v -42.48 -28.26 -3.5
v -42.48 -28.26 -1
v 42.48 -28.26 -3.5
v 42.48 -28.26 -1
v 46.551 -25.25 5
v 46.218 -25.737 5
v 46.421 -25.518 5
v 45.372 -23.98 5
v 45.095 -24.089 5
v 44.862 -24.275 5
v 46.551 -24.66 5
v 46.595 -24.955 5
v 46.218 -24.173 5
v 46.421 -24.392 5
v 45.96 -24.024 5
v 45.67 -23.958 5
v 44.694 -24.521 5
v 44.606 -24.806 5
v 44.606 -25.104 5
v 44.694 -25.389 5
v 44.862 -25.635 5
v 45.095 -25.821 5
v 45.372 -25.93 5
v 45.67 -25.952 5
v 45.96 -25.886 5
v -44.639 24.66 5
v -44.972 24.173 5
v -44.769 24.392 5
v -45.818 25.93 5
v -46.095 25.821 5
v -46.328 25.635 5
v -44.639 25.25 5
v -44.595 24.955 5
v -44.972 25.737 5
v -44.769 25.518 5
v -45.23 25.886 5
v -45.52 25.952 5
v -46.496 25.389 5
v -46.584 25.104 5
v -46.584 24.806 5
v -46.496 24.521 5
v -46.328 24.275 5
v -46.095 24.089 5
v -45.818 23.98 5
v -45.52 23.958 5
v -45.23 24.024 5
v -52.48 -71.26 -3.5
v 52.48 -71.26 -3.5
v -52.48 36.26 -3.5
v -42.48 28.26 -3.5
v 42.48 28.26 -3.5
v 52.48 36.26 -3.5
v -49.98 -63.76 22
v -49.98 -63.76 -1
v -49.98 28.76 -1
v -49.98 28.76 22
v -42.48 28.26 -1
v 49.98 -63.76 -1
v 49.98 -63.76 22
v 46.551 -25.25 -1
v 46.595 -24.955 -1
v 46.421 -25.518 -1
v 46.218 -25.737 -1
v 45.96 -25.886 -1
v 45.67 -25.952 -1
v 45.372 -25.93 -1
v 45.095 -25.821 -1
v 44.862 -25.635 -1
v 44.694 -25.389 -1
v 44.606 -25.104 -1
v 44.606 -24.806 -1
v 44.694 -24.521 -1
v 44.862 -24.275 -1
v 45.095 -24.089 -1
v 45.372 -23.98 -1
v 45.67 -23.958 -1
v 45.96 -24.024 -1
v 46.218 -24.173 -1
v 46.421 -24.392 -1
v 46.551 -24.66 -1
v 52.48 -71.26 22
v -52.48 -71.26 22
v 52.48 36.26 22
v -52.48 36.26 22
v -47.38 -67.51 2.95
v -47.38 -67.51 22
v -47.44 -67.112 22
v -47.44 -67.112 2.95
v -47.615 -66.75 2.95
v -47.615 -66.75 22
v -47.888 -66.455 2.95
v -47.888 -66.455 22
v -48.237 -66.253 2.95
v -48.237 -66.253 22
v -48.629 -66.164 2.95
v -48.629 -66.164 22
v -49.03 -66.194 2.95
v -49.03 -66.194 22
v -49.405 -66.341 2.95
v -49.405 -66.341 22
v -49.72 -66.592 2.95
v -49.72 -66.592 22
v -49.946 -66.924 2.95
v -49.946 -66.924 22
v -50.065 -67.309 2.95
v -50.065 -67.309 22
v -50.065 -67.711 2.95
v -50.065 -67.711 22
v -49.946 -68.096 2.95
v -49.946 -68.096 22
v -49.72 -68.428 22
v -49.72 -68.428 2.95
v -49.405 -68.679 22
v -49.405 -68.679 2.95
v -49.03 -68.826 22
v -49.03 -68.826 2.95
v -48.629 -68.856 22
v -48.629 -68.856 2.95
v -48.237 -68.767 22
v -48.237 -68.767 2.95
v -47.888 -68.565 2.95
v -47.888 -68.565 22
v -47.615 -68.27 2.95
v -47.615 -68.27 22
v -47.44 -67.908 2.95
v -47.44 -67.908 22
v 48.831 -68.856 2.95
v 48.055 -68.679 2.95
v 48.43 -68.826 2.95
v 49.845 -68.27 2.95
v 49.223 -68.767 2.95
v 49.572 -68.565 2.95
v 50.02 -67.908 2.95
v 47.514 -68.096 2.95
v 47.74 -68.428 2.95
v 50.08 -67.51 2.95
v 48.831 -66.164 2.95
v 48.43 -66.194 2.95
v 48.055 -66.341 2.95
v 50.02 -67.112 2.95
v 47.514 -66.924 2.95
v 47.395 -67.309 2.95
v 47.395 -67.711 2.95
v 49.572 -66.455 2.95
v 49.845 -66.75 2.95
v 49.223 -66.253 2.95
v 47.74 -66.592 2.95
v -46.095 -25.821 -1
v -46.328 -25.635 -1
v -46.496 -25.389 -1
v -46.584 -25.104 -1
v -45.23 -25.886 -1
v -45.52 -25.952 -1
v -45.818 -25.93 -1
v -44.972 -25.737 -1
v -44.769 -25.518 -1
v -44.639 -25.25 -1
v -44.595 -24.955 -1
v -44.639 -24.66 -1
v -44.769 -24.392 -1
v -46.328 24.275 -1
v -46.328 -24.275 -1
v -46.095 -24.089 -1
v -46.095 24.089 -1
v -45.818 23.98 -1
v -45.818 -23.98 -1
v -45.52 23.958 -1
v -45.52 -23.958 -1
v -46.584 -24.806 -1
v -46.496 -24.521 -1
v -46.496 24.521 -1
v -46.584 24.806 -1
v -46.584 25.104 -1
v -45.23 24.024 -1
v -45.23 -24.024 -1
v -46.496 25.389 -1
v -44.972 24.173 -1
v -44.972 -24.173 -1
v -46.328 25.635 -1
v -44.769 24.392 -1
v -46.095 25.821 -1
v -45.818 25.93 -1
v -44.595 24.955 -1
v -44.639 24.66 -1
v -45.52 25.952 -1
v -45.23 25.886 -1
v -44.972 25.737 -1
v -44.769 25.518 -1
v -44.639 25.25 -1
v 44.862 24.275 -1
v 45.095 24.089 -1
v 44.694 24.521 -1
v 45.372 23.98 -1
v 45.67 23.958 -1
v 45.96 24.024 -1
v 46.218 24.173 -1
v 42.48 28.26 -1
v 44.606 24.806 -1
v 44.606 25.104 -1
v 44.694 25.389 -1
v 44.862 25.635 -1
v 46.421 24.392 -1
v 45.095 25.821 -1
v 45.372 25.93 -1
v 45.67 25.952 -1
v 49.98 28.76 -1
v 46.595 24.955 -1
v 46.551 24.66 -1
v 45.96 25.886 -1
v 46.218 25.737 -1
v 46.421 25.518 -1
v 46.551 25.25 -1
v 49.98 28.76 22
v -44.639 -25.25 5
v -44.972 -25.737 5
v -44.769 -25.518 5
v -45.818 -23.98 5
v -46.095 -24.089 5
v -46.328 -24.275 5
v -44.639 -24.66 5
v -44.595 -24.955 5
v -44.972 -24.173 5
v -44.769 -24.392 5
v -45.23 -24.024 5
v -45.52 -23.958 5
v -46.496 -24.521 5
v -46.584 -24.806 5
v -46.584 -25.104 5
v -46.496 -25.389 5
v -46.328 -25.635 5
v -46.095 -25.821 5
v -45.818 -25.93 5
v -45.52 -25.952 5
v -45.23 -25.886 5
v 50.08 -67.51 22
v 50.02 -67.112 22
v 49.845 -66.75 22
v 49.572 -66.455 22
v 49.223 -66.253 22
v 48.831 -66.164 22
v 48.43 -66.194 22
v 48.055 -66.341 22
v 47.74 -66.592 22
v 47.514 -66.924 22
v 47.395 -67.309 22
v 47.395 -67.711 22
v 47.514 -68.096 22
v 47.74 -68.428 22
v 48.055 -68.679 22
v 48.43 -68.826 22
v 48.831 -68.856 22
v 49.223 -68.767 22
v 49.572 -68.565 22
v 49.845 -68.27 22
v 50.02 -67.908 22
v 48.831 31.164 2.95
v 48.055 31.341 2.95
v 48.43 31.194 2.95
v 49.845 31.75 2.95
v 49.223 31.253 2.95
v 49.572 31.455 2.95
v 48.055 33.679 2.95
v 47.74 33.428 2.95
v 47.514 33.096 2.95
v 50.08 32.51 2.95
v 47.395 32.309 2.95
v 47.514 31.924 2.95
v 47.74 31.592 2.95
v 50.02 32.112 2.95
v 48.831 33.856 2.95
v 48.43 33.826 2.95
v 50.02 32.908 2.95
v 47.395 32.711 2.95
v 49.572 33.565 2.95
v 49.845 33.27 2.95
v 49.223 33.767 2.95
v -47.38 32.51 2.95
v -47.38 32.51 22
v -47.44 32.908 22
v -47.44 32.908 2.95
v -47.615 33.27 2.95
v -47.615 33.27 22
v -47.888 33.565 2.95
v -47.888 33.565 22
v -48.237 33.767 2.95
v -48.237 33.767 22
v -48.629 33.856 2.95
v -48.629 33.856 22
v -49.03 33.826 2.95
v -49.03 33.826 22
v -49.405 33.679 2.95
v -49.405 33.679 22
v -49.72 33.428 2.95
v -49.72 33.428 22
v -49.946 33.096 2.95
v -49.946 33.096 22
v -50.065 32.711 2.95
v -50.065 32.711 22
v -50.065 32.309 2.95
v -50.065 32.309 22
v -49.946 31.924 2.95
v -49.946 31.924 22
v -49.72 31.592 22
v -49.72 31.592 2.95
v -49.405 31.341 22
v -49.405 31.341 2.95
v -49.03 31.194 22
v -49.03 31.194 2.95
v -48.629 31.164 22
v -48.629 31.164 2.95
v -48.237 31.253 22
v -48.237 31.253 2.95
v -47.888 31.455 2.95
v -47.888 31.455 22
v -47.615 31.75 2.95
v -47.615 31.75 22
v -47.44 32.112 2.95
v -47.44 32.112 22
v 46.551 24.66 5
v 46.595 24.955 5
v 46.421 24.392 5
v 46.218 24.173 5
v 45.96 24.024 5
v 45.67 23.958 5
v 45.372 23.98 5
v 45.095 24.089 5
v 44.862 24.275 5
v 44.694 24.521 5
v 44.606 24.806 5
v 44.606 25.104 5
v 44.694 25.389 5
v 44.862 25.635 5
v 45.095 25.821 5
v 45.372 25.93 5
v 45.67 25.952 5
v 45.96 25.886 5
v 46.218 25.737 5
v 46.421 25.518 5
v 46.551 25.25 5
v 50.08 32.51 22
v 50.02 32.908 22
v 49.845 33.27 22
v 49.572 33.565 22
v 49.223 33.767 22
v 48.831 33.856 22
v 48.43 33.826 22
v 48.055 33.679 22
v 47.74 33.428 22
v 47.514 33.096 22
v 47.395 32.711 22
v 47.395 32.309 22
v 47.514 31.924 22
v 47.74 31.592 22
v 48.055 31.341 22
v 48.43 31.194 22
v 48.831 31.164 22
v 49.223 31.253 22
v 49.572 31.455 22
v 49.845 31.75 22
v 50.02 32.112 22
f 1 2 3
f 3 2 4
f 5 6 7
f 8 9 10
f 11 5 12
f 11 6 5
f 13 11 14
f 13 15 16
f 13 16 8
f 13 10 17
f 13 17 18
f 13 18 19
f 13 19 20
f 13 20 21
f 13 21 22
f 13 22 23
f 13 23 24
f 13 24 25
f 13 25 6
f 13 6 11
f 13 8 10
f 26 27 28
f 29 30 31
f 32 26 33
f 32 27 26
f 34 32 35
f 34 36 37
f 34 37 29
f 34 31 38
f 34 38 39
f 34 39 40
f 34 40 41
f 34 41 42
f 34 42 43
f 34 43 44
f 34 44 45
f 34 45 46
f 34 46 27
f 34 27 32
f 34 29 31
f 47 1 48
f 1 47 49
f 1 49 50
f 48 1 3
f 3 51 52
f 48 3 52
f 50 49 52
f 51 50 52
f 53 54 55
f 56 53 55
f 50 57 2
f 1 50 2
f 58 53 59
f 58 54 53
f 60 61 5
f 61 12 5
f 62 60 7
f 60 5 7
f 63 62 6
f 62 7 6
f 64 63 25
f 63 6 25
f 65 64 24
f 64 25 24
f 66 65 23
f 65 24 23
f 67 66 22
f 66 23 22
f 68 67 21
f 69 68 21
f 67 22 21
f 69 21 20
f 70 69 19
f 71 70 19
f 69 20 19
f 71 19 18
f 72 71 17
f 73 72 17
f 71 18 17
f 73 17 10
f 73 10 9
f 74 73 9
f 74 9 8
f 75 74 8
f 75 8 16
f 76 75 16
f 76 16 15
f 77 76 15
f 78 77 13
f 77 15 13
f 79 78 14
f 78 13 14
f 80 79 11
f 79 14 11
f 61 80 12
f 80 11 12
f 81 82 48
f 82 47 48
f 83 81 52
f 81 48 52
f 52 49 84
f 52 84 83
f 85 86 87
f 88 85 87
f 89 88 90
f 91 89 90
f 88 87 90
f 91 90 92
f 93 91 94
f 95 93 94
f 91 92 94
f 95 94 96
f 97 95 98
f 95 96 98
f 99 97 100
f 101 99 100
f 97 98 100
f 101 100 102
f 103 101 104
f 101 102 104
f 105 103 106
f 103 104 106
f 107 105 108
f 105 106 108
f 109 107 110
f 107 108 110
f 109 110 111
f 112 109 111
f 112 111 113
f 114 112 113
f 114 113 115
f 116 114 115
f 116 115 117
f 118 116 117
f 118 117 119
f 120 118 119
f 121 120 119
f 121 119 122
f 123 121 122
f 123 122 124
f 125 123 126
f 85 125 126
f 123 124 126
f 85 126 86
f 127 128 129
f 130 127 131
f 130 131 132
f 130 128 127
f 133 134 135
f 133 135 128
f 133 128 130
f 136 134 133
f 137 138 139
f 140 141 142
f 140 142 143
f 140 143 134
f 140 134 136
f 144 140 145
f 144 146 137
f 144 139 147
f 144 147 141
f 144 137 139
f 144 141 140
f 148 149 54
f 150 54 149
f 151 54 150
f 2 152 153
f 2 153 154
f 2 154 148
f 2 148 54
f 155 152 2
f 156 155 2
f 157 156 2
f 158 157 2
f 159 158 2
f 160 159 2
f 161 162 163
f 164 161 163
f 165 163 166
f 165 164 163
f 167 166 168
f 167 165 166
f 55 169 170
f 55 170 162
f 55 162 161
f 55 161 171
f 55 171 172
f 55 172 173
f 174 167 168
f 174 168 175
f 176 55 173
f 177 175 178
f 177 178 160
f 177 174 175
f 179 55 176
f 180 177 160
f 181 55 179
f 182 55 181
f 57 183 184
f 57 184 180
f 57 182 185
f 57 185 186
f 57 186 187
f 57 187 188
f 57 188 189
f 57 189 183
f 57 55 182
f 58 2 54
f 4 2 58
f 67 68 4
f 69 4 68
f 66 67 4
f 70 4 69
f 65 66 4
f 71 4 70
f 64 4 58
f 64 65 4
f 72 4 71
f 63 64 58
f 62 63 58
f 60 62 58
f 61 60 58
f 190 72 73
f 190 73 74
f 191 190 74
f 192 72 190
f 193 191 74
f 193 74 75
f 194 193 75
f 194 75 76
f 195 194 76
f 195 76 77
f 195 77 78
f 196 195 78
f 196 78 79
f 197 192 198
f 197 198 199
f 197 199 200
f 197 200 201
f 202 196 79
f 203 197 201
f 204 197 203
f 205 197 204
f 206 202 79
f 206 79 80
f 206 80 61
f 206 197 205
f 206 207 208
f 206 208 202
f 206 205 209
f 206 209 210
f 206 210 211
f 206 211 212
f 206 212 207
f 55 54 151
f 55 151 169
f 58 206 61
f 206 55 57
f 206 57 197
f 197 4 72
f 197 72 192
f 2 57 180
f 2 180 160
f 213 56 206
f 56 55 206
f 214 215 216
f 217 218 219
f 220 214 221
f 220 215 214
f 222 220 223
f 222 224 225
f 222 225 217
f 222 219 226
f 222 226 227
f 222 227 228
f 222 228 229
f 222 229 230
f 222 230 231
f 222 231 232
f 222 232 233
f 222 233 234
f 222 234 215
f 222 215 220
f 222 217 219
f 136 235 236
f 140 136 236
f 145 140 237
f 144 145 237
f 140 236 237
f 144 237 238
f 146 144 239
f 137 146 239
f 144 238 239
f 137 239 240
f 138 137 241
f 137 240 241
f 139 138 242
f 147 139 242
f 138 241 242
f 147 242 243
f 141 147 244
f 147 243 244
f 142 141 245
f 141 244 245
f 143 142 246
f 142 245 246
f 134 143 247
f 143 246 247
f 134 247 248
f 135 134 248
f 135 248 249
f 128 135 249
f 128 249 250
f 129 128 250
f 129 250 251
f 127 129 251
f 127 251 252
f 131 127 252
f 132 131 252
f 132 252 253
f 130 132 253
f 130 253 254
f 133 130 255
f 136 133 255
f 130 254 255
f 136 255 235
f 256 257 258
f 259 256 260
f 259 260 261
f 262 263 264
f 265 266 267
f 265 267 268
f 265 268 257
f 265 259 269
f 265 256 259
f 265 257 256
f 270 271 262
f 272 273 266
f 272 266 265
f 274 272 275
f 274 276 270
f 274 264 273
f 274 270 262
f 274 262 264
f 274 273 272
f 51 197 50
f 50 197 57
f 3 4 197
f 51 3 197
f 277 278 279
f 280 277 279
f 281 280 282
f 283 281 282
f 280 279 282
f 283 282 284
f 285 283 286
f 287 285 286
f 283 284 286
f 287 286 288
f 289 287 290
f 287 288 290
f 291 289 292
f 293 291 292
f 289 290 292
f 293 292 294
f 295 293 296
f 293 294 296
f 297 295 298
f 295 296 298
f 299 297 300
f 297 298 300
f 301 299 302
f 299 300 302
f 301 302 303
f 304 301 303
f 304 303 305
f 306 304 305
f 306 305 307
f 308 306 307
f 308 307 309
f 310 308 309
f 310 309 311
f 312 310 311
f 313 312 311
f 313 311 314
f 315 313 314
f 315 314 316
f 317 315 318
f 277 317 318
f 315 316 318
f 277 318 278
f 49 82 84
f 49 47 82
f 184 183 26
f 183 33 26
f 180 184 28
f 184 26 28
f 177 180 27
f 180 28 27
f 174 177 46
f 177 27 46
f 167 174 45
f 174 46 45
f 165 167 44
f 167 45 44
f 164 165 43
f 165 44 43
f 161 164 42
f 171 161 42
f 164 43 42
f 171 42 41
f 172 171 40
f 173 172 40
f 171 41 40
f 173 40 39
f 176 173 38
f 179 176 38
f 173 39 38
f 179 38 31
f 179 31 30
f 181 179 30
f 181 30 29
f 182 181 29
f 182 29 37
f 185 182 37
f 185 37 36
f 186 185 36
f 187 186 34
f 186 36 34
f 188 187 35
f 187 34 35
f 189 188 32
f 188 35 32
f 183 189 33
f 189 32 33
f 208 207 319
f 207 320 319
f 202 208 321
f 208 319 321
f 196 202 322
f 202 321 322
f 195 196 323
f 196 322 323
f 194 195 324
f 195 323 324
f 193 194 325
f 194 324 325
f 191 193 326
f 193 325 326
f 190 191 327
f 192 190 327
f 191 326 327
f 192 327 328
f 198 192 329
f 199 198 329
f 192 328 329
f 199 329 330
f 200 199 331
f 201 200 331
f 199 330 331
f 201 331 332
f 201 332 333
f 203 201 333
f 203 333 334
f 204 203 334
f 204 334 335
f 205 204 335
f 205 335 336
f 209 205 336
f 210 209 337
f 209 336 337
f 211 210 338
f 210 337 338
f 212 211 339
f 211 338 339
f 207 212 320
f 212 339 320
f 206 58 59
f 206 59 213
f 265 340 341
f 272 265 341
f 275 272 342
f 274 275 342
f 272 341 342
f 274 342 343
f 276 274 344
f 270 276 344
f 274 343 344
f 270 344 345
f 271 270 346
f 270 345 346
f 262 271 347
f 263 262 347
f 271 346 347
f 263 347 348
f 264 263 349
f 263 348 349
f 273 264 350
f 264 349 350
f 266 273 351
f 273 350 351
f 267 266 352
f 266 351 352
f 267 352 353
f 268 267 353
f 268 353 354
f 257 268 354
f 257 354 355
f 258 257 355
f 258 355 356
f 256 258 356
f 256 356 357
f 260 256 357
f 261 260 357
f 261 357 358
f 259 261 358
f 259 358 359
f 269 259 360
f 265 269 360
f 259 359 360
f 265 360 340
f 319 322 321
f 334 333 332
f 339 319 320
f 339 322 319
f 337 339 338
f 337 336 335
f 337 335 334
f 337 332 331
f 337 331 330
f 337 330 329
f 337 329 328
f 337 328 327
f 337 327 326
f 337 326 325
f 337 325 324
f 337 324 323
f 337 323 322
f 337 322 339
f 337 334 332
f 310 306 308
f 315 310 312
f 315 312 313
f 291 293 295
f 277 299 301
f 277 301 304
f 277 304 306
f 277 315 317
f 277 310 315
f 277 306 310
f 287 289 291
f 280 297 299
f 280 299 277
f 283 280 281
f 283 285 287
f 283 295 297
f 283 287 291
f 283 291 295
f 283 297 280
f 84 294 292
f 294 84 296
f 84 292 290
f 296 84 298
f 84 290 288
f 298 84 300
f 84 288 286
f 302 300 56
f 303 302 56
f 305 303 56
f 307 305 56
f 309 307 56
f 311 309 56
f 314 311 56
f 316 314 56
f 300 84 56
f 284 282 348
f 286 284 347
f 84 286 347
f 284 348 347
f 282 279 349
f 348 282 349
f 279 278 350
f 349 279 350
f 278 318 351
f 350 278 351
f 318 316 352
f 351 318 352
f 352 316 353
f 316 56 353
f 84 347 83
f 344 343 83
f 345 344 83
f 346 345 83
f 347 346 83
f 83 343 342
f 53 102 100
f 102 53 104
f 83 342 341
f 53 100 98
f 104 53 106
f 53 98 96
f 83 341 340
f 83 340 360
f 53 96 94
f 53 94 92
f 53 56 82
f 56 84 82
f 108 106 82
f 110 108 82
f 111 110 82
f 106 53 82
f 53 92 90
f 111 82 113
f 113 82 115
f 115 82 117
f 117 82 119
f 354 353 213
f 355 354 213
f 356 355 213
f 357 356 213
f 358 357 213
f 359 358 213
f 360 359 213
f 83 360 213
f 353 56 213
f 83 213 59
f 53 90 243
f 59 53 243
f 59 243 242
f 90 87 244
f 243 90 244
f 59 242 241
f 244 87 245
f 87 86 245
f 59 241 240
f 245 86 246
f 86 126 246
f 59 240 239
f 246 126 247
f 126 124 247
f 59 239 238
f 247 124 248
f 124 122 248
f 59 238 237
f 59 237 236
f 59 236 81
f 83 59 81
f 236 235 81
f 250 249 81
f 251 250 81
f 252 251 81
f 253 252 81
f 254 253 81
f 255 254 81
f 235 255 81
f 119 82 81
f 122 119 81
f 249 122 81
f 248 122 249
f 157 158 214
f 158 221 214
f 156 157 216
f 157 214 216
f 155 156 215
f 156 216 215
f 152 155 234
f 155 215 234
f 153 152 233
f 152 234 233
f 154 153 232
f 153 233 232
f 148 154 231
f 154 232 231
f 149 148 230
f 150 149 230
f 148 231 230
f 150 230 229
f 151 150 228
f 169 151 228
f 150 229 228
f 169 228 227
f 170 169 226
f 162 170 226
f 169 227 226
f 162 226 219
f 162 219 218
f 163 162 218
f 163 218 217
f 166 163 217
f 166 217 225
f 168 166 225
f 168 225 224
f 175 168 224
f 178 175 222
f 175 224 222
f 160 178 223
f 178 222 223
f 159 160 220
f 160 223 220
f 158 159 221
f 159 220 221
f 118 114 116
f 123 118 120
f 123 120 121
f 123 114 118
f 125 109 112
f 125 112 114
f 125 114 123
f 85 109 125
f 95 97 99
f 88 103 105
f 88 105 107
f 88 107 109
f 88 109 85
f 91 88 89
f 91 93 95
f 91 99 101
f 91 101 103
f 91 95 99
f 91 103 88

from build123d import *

# Parameters (mm, degrees)
F0_W      = 104.96
F0_H      = 107.52
F0_W_2    = 6.23
F0_H_2    = 6.61
F0_R      = 1
F1_DEPTH  = 3.5
F2_DEPTH  = 22
F3_T      = -2.5
F4_DEPTH  = 3.501
F5_DEPTH  = 5
F5_FACE_R = 1
F6_DEPTH  = 1
F7_DEPTH  = 5
F8_DEPTH  = 5
F9_R      = 1.35
F10_DEPTH = 19.05


with BuildPart() as f1:
    # F0 (on Top) → F1 (new body)
    with BuildSketch(Plane.XY):
        with Locations((0, -17.5)):
            Rectangle(F0_W, F0_H)
        Polygon((-48.71, 28.26), (-42.48, 28.26), (42.48, 28.26), (48.71, 28.26), (48.71, 21.65), (42.48, 21.65), (42.48, -21.65), (48.71, -21.65), (48.71, -28.26), (42.48, -28.26), (-42.48, -28.26), (-48.71, -28.26), (-48.71, -21.65), (-42.48, -21.65), (-42.48, 21.65), (-48.71, 21.65), align=None, mode=Mode.SUBTRACT)
        with Locations((-45.595, -24.955)):
            Rectangle(F0_W_2, F0_H_2)
        with Locations((-45.595, -24.955)):
            Circle(F0_R, mode=Mode.SUBTRACT)
        with Locations((-45.595, 24.955)):
            Rectangle(F0_W_2, F0_H_2)
        with Locations((-45.595, 24.955)):
            Circle(F0_R, mode=Mode.SUBTRACT)
        with Locations((-45.595, 24.955)):
            Circle(F0_R)
        with Locations((-45.595, -24.955)):
            Circle(F0_R)
        with Locations((45.595, -24.955)):
            Rectangle(F0_W_2, F0_H_2)
        with Locations((45.595, -24.955)):
            Circle(F0_R, mode=Mode.SUBTRACT)
        with Locations((45.595, -24.955)):
            Circle(F0_R)
        with Locations((45.595, 24.955)):
            Rectangle(F0_W_2, F0_H_2)
        with Locations((45.595, 24.955)):
            Circle(F0_R, mode=Mode.SUBTRACT)
        with Locations((45.595, 24.955)):
            Circle(F0_R)
        Polygon((42.48, 28.26), (-42.48, 28.26), (-42.48, 21.65), (-42.48, -21.65), (-42.48, -28.26), (42.48, -28.26), (42.48, -21.65), (42.48, 21.65), align=None)
    extrude(amount=-F1_DEPTH)

    # F0 (on Top) → F2 (join)
    with BuildSketch(Plane.XY):
        with Locations((0, -17.5)):
            Rectangle(F0_W, F0_H)
        Polygon((-48.71, 28.26), (-42.48, 28.26), (42.48, 28.26), (48.71, 28.26), (48.71, 21.65), (42.48, 21.65), (42.48, -21.65), (48.71, -21.65), (48.71, -28.26), (42.48, -28.26), (-42.48, -28.26), (-48.71, -28.26), (-48.71, -21.65), (-42.48, -21.65), (-42.48, 21.65), (-48.71, 21.65), align=None, mode=Mode.SUBTRACT)
        with Locations((-45.595, -24.955)):
            Rectangle(F0_W_2, F0_H_2)
        with Locations((-45.595, -24.955)):
            Circle(F0_R, mode=Mode.SUBTRACT)
        with Locations((-45.595, 24.955)):
            Rectangle(F0_W_2, F0_H_2)
        with Locations((-45.595, 24.955)):
            Circle(F0_R, mode=Mode.SUBTRACT)
        with Locations((45.595, 24.955)):
            Rectangle(F0_W_2, F0_H_2)
        with Locations((45.595, 24.955)):
            Circle(F0_R, mode=Mode.SUBTRACT)
        with Locations((45.595, -24.955)):
            Rectangle(F0_W_2, F0_H_2)
        with Locations((45.595, -24.955)):
            Circle(F0_R, mode=Mode.SUBTRACT)
        with Locations((-45.595, -24.955)):
            Circle(F0_R)
        with Locations((-45.595, 24.955)):
            Circle(F0_R)
        with Locations((45.595, 24.955)):
            Circle(F0_R)
        with Locations((45.595, -24.955)):
            Circle(F0_R)
        Polygon((42.48, 28.26), (-42.48, 28.26), (-42.48, 21.65), (-42.48, -21.65), (-42.48, -28.26), (42.48, -28.26), (42.48, -21.65), (42.48, 21.65), align=None)
    extrude(amount=F2_DEPTH)

    # F3
    f3_openings = [f1.faces().sort_by_distance(p)[0] for p in [
        (0, -17.5, 22),
    ]]
    offset(amount=F3_T, openings=f3_openings)

    # F0 (on Top) → F4 (cut, through all)
    with BuildSketch(Plane.XY):
        Polygon((42.48, 28.26), (-42.48, 28.26), (-42.48, 21.65), (-42.48, -21.65), (-42.48, -28.26), (42.48, -28.26), (42.48, -21.65), (42.48, 21.65), align=None)
    extrude(amount=-F4_DEPTH, mode=Mode.SUBTRACT)



with BuildPart() as f5:
    # F0 (on Top) → F5 (new body)
    with BuildSketch(Plane.XY):
        with Locations((-45.595, -24.955)):
            Circle(F0_R)
    extrude(amount=F5_DEPTH)


with BuildPart() as f5b:
    # F0 (on Top) → F5, piece 2 (new body)
    with BuildSketch(Plane.XY):
        with Locations((45.595, 24.955)):
            Circle(F0_R)
    extrude(amount=F5_DEPTH)


with BuildPart() as f5c:
    # F0 (on Top) → F5, piece 3 (new body)
    with BuildSketch(Plane.XY):
        with Locations((45.595, -24.955)):
            Circle(F0_R)
    extrude(amount=F5_DEPTH)


with BuildPart() as f5d:
    # F0 (on Top) → F5, piece 4 (new body)
    with BuildSketch(Plane.XY):
        with Locations((-45.595, 24.955)):
            Circle(F0_R)
    extrude(amount=F5_DEPTH)


with BuildPart() as f1_1:
    add(f1.part)

    add(f5.part)  # F6 merges F5

    add(f5b.part)  # F6 merges F5b

    add(f5c.part)  # F6 merges F5c

    add(f5d.part)  # F6 merges F5d
    # F5_face (on face) → F6 (join)
    with BuildSketch(Plane(origin=(-45.595, 24.955, 0), x_dir=(1, 0, 0), z_dir=(0, 0, -1))):
        Circle(F5_FACE_R)
        with Locations((0, 49.91)):
            Circle(F5_FACE_R)
        with Locations((91.19, 49.91)):
            Circle(F5_FACE_R)
        with Locations((91.19, 0)):
            Circle(F5_FACE_R)
    extrude(amount=F6_DEPTH)

    # F7 (add): a face of the model
    f7_faces = [f1_1.faces().sort_by_distance(p)[0] for p in [
        (0, 33.76, 10.5),
    ]]
    extrude(f7_faces, amount=F7_DEPTH)

    # F8 (add): a face of the model
    f8_faces = [f1_1.faces().sort_by_distance(p)[0] for p in [
        (0, -68.76, 10.5),
    ]]
    extrude(f8_faces, amount=F8_DEPTH)

    # F9 (on face) → F10 (cut)
    with BuildSketch(Plane.XY.offset(22)):
        with Locations((-48.73, 32.51)):
            Circle(F9_R)
        with Locations((48.73, 32.51)):
            Circle(F9_R)
        with Locations((-48.73, -67.51)):
            Circle(F9_R)
        with Locations((48.73, -67.51)):
            Circle(F9_R)
    extrude(amount=-F10_DEPTH, mode=Mode.SUBTRACT)


solid = f1_1.part
